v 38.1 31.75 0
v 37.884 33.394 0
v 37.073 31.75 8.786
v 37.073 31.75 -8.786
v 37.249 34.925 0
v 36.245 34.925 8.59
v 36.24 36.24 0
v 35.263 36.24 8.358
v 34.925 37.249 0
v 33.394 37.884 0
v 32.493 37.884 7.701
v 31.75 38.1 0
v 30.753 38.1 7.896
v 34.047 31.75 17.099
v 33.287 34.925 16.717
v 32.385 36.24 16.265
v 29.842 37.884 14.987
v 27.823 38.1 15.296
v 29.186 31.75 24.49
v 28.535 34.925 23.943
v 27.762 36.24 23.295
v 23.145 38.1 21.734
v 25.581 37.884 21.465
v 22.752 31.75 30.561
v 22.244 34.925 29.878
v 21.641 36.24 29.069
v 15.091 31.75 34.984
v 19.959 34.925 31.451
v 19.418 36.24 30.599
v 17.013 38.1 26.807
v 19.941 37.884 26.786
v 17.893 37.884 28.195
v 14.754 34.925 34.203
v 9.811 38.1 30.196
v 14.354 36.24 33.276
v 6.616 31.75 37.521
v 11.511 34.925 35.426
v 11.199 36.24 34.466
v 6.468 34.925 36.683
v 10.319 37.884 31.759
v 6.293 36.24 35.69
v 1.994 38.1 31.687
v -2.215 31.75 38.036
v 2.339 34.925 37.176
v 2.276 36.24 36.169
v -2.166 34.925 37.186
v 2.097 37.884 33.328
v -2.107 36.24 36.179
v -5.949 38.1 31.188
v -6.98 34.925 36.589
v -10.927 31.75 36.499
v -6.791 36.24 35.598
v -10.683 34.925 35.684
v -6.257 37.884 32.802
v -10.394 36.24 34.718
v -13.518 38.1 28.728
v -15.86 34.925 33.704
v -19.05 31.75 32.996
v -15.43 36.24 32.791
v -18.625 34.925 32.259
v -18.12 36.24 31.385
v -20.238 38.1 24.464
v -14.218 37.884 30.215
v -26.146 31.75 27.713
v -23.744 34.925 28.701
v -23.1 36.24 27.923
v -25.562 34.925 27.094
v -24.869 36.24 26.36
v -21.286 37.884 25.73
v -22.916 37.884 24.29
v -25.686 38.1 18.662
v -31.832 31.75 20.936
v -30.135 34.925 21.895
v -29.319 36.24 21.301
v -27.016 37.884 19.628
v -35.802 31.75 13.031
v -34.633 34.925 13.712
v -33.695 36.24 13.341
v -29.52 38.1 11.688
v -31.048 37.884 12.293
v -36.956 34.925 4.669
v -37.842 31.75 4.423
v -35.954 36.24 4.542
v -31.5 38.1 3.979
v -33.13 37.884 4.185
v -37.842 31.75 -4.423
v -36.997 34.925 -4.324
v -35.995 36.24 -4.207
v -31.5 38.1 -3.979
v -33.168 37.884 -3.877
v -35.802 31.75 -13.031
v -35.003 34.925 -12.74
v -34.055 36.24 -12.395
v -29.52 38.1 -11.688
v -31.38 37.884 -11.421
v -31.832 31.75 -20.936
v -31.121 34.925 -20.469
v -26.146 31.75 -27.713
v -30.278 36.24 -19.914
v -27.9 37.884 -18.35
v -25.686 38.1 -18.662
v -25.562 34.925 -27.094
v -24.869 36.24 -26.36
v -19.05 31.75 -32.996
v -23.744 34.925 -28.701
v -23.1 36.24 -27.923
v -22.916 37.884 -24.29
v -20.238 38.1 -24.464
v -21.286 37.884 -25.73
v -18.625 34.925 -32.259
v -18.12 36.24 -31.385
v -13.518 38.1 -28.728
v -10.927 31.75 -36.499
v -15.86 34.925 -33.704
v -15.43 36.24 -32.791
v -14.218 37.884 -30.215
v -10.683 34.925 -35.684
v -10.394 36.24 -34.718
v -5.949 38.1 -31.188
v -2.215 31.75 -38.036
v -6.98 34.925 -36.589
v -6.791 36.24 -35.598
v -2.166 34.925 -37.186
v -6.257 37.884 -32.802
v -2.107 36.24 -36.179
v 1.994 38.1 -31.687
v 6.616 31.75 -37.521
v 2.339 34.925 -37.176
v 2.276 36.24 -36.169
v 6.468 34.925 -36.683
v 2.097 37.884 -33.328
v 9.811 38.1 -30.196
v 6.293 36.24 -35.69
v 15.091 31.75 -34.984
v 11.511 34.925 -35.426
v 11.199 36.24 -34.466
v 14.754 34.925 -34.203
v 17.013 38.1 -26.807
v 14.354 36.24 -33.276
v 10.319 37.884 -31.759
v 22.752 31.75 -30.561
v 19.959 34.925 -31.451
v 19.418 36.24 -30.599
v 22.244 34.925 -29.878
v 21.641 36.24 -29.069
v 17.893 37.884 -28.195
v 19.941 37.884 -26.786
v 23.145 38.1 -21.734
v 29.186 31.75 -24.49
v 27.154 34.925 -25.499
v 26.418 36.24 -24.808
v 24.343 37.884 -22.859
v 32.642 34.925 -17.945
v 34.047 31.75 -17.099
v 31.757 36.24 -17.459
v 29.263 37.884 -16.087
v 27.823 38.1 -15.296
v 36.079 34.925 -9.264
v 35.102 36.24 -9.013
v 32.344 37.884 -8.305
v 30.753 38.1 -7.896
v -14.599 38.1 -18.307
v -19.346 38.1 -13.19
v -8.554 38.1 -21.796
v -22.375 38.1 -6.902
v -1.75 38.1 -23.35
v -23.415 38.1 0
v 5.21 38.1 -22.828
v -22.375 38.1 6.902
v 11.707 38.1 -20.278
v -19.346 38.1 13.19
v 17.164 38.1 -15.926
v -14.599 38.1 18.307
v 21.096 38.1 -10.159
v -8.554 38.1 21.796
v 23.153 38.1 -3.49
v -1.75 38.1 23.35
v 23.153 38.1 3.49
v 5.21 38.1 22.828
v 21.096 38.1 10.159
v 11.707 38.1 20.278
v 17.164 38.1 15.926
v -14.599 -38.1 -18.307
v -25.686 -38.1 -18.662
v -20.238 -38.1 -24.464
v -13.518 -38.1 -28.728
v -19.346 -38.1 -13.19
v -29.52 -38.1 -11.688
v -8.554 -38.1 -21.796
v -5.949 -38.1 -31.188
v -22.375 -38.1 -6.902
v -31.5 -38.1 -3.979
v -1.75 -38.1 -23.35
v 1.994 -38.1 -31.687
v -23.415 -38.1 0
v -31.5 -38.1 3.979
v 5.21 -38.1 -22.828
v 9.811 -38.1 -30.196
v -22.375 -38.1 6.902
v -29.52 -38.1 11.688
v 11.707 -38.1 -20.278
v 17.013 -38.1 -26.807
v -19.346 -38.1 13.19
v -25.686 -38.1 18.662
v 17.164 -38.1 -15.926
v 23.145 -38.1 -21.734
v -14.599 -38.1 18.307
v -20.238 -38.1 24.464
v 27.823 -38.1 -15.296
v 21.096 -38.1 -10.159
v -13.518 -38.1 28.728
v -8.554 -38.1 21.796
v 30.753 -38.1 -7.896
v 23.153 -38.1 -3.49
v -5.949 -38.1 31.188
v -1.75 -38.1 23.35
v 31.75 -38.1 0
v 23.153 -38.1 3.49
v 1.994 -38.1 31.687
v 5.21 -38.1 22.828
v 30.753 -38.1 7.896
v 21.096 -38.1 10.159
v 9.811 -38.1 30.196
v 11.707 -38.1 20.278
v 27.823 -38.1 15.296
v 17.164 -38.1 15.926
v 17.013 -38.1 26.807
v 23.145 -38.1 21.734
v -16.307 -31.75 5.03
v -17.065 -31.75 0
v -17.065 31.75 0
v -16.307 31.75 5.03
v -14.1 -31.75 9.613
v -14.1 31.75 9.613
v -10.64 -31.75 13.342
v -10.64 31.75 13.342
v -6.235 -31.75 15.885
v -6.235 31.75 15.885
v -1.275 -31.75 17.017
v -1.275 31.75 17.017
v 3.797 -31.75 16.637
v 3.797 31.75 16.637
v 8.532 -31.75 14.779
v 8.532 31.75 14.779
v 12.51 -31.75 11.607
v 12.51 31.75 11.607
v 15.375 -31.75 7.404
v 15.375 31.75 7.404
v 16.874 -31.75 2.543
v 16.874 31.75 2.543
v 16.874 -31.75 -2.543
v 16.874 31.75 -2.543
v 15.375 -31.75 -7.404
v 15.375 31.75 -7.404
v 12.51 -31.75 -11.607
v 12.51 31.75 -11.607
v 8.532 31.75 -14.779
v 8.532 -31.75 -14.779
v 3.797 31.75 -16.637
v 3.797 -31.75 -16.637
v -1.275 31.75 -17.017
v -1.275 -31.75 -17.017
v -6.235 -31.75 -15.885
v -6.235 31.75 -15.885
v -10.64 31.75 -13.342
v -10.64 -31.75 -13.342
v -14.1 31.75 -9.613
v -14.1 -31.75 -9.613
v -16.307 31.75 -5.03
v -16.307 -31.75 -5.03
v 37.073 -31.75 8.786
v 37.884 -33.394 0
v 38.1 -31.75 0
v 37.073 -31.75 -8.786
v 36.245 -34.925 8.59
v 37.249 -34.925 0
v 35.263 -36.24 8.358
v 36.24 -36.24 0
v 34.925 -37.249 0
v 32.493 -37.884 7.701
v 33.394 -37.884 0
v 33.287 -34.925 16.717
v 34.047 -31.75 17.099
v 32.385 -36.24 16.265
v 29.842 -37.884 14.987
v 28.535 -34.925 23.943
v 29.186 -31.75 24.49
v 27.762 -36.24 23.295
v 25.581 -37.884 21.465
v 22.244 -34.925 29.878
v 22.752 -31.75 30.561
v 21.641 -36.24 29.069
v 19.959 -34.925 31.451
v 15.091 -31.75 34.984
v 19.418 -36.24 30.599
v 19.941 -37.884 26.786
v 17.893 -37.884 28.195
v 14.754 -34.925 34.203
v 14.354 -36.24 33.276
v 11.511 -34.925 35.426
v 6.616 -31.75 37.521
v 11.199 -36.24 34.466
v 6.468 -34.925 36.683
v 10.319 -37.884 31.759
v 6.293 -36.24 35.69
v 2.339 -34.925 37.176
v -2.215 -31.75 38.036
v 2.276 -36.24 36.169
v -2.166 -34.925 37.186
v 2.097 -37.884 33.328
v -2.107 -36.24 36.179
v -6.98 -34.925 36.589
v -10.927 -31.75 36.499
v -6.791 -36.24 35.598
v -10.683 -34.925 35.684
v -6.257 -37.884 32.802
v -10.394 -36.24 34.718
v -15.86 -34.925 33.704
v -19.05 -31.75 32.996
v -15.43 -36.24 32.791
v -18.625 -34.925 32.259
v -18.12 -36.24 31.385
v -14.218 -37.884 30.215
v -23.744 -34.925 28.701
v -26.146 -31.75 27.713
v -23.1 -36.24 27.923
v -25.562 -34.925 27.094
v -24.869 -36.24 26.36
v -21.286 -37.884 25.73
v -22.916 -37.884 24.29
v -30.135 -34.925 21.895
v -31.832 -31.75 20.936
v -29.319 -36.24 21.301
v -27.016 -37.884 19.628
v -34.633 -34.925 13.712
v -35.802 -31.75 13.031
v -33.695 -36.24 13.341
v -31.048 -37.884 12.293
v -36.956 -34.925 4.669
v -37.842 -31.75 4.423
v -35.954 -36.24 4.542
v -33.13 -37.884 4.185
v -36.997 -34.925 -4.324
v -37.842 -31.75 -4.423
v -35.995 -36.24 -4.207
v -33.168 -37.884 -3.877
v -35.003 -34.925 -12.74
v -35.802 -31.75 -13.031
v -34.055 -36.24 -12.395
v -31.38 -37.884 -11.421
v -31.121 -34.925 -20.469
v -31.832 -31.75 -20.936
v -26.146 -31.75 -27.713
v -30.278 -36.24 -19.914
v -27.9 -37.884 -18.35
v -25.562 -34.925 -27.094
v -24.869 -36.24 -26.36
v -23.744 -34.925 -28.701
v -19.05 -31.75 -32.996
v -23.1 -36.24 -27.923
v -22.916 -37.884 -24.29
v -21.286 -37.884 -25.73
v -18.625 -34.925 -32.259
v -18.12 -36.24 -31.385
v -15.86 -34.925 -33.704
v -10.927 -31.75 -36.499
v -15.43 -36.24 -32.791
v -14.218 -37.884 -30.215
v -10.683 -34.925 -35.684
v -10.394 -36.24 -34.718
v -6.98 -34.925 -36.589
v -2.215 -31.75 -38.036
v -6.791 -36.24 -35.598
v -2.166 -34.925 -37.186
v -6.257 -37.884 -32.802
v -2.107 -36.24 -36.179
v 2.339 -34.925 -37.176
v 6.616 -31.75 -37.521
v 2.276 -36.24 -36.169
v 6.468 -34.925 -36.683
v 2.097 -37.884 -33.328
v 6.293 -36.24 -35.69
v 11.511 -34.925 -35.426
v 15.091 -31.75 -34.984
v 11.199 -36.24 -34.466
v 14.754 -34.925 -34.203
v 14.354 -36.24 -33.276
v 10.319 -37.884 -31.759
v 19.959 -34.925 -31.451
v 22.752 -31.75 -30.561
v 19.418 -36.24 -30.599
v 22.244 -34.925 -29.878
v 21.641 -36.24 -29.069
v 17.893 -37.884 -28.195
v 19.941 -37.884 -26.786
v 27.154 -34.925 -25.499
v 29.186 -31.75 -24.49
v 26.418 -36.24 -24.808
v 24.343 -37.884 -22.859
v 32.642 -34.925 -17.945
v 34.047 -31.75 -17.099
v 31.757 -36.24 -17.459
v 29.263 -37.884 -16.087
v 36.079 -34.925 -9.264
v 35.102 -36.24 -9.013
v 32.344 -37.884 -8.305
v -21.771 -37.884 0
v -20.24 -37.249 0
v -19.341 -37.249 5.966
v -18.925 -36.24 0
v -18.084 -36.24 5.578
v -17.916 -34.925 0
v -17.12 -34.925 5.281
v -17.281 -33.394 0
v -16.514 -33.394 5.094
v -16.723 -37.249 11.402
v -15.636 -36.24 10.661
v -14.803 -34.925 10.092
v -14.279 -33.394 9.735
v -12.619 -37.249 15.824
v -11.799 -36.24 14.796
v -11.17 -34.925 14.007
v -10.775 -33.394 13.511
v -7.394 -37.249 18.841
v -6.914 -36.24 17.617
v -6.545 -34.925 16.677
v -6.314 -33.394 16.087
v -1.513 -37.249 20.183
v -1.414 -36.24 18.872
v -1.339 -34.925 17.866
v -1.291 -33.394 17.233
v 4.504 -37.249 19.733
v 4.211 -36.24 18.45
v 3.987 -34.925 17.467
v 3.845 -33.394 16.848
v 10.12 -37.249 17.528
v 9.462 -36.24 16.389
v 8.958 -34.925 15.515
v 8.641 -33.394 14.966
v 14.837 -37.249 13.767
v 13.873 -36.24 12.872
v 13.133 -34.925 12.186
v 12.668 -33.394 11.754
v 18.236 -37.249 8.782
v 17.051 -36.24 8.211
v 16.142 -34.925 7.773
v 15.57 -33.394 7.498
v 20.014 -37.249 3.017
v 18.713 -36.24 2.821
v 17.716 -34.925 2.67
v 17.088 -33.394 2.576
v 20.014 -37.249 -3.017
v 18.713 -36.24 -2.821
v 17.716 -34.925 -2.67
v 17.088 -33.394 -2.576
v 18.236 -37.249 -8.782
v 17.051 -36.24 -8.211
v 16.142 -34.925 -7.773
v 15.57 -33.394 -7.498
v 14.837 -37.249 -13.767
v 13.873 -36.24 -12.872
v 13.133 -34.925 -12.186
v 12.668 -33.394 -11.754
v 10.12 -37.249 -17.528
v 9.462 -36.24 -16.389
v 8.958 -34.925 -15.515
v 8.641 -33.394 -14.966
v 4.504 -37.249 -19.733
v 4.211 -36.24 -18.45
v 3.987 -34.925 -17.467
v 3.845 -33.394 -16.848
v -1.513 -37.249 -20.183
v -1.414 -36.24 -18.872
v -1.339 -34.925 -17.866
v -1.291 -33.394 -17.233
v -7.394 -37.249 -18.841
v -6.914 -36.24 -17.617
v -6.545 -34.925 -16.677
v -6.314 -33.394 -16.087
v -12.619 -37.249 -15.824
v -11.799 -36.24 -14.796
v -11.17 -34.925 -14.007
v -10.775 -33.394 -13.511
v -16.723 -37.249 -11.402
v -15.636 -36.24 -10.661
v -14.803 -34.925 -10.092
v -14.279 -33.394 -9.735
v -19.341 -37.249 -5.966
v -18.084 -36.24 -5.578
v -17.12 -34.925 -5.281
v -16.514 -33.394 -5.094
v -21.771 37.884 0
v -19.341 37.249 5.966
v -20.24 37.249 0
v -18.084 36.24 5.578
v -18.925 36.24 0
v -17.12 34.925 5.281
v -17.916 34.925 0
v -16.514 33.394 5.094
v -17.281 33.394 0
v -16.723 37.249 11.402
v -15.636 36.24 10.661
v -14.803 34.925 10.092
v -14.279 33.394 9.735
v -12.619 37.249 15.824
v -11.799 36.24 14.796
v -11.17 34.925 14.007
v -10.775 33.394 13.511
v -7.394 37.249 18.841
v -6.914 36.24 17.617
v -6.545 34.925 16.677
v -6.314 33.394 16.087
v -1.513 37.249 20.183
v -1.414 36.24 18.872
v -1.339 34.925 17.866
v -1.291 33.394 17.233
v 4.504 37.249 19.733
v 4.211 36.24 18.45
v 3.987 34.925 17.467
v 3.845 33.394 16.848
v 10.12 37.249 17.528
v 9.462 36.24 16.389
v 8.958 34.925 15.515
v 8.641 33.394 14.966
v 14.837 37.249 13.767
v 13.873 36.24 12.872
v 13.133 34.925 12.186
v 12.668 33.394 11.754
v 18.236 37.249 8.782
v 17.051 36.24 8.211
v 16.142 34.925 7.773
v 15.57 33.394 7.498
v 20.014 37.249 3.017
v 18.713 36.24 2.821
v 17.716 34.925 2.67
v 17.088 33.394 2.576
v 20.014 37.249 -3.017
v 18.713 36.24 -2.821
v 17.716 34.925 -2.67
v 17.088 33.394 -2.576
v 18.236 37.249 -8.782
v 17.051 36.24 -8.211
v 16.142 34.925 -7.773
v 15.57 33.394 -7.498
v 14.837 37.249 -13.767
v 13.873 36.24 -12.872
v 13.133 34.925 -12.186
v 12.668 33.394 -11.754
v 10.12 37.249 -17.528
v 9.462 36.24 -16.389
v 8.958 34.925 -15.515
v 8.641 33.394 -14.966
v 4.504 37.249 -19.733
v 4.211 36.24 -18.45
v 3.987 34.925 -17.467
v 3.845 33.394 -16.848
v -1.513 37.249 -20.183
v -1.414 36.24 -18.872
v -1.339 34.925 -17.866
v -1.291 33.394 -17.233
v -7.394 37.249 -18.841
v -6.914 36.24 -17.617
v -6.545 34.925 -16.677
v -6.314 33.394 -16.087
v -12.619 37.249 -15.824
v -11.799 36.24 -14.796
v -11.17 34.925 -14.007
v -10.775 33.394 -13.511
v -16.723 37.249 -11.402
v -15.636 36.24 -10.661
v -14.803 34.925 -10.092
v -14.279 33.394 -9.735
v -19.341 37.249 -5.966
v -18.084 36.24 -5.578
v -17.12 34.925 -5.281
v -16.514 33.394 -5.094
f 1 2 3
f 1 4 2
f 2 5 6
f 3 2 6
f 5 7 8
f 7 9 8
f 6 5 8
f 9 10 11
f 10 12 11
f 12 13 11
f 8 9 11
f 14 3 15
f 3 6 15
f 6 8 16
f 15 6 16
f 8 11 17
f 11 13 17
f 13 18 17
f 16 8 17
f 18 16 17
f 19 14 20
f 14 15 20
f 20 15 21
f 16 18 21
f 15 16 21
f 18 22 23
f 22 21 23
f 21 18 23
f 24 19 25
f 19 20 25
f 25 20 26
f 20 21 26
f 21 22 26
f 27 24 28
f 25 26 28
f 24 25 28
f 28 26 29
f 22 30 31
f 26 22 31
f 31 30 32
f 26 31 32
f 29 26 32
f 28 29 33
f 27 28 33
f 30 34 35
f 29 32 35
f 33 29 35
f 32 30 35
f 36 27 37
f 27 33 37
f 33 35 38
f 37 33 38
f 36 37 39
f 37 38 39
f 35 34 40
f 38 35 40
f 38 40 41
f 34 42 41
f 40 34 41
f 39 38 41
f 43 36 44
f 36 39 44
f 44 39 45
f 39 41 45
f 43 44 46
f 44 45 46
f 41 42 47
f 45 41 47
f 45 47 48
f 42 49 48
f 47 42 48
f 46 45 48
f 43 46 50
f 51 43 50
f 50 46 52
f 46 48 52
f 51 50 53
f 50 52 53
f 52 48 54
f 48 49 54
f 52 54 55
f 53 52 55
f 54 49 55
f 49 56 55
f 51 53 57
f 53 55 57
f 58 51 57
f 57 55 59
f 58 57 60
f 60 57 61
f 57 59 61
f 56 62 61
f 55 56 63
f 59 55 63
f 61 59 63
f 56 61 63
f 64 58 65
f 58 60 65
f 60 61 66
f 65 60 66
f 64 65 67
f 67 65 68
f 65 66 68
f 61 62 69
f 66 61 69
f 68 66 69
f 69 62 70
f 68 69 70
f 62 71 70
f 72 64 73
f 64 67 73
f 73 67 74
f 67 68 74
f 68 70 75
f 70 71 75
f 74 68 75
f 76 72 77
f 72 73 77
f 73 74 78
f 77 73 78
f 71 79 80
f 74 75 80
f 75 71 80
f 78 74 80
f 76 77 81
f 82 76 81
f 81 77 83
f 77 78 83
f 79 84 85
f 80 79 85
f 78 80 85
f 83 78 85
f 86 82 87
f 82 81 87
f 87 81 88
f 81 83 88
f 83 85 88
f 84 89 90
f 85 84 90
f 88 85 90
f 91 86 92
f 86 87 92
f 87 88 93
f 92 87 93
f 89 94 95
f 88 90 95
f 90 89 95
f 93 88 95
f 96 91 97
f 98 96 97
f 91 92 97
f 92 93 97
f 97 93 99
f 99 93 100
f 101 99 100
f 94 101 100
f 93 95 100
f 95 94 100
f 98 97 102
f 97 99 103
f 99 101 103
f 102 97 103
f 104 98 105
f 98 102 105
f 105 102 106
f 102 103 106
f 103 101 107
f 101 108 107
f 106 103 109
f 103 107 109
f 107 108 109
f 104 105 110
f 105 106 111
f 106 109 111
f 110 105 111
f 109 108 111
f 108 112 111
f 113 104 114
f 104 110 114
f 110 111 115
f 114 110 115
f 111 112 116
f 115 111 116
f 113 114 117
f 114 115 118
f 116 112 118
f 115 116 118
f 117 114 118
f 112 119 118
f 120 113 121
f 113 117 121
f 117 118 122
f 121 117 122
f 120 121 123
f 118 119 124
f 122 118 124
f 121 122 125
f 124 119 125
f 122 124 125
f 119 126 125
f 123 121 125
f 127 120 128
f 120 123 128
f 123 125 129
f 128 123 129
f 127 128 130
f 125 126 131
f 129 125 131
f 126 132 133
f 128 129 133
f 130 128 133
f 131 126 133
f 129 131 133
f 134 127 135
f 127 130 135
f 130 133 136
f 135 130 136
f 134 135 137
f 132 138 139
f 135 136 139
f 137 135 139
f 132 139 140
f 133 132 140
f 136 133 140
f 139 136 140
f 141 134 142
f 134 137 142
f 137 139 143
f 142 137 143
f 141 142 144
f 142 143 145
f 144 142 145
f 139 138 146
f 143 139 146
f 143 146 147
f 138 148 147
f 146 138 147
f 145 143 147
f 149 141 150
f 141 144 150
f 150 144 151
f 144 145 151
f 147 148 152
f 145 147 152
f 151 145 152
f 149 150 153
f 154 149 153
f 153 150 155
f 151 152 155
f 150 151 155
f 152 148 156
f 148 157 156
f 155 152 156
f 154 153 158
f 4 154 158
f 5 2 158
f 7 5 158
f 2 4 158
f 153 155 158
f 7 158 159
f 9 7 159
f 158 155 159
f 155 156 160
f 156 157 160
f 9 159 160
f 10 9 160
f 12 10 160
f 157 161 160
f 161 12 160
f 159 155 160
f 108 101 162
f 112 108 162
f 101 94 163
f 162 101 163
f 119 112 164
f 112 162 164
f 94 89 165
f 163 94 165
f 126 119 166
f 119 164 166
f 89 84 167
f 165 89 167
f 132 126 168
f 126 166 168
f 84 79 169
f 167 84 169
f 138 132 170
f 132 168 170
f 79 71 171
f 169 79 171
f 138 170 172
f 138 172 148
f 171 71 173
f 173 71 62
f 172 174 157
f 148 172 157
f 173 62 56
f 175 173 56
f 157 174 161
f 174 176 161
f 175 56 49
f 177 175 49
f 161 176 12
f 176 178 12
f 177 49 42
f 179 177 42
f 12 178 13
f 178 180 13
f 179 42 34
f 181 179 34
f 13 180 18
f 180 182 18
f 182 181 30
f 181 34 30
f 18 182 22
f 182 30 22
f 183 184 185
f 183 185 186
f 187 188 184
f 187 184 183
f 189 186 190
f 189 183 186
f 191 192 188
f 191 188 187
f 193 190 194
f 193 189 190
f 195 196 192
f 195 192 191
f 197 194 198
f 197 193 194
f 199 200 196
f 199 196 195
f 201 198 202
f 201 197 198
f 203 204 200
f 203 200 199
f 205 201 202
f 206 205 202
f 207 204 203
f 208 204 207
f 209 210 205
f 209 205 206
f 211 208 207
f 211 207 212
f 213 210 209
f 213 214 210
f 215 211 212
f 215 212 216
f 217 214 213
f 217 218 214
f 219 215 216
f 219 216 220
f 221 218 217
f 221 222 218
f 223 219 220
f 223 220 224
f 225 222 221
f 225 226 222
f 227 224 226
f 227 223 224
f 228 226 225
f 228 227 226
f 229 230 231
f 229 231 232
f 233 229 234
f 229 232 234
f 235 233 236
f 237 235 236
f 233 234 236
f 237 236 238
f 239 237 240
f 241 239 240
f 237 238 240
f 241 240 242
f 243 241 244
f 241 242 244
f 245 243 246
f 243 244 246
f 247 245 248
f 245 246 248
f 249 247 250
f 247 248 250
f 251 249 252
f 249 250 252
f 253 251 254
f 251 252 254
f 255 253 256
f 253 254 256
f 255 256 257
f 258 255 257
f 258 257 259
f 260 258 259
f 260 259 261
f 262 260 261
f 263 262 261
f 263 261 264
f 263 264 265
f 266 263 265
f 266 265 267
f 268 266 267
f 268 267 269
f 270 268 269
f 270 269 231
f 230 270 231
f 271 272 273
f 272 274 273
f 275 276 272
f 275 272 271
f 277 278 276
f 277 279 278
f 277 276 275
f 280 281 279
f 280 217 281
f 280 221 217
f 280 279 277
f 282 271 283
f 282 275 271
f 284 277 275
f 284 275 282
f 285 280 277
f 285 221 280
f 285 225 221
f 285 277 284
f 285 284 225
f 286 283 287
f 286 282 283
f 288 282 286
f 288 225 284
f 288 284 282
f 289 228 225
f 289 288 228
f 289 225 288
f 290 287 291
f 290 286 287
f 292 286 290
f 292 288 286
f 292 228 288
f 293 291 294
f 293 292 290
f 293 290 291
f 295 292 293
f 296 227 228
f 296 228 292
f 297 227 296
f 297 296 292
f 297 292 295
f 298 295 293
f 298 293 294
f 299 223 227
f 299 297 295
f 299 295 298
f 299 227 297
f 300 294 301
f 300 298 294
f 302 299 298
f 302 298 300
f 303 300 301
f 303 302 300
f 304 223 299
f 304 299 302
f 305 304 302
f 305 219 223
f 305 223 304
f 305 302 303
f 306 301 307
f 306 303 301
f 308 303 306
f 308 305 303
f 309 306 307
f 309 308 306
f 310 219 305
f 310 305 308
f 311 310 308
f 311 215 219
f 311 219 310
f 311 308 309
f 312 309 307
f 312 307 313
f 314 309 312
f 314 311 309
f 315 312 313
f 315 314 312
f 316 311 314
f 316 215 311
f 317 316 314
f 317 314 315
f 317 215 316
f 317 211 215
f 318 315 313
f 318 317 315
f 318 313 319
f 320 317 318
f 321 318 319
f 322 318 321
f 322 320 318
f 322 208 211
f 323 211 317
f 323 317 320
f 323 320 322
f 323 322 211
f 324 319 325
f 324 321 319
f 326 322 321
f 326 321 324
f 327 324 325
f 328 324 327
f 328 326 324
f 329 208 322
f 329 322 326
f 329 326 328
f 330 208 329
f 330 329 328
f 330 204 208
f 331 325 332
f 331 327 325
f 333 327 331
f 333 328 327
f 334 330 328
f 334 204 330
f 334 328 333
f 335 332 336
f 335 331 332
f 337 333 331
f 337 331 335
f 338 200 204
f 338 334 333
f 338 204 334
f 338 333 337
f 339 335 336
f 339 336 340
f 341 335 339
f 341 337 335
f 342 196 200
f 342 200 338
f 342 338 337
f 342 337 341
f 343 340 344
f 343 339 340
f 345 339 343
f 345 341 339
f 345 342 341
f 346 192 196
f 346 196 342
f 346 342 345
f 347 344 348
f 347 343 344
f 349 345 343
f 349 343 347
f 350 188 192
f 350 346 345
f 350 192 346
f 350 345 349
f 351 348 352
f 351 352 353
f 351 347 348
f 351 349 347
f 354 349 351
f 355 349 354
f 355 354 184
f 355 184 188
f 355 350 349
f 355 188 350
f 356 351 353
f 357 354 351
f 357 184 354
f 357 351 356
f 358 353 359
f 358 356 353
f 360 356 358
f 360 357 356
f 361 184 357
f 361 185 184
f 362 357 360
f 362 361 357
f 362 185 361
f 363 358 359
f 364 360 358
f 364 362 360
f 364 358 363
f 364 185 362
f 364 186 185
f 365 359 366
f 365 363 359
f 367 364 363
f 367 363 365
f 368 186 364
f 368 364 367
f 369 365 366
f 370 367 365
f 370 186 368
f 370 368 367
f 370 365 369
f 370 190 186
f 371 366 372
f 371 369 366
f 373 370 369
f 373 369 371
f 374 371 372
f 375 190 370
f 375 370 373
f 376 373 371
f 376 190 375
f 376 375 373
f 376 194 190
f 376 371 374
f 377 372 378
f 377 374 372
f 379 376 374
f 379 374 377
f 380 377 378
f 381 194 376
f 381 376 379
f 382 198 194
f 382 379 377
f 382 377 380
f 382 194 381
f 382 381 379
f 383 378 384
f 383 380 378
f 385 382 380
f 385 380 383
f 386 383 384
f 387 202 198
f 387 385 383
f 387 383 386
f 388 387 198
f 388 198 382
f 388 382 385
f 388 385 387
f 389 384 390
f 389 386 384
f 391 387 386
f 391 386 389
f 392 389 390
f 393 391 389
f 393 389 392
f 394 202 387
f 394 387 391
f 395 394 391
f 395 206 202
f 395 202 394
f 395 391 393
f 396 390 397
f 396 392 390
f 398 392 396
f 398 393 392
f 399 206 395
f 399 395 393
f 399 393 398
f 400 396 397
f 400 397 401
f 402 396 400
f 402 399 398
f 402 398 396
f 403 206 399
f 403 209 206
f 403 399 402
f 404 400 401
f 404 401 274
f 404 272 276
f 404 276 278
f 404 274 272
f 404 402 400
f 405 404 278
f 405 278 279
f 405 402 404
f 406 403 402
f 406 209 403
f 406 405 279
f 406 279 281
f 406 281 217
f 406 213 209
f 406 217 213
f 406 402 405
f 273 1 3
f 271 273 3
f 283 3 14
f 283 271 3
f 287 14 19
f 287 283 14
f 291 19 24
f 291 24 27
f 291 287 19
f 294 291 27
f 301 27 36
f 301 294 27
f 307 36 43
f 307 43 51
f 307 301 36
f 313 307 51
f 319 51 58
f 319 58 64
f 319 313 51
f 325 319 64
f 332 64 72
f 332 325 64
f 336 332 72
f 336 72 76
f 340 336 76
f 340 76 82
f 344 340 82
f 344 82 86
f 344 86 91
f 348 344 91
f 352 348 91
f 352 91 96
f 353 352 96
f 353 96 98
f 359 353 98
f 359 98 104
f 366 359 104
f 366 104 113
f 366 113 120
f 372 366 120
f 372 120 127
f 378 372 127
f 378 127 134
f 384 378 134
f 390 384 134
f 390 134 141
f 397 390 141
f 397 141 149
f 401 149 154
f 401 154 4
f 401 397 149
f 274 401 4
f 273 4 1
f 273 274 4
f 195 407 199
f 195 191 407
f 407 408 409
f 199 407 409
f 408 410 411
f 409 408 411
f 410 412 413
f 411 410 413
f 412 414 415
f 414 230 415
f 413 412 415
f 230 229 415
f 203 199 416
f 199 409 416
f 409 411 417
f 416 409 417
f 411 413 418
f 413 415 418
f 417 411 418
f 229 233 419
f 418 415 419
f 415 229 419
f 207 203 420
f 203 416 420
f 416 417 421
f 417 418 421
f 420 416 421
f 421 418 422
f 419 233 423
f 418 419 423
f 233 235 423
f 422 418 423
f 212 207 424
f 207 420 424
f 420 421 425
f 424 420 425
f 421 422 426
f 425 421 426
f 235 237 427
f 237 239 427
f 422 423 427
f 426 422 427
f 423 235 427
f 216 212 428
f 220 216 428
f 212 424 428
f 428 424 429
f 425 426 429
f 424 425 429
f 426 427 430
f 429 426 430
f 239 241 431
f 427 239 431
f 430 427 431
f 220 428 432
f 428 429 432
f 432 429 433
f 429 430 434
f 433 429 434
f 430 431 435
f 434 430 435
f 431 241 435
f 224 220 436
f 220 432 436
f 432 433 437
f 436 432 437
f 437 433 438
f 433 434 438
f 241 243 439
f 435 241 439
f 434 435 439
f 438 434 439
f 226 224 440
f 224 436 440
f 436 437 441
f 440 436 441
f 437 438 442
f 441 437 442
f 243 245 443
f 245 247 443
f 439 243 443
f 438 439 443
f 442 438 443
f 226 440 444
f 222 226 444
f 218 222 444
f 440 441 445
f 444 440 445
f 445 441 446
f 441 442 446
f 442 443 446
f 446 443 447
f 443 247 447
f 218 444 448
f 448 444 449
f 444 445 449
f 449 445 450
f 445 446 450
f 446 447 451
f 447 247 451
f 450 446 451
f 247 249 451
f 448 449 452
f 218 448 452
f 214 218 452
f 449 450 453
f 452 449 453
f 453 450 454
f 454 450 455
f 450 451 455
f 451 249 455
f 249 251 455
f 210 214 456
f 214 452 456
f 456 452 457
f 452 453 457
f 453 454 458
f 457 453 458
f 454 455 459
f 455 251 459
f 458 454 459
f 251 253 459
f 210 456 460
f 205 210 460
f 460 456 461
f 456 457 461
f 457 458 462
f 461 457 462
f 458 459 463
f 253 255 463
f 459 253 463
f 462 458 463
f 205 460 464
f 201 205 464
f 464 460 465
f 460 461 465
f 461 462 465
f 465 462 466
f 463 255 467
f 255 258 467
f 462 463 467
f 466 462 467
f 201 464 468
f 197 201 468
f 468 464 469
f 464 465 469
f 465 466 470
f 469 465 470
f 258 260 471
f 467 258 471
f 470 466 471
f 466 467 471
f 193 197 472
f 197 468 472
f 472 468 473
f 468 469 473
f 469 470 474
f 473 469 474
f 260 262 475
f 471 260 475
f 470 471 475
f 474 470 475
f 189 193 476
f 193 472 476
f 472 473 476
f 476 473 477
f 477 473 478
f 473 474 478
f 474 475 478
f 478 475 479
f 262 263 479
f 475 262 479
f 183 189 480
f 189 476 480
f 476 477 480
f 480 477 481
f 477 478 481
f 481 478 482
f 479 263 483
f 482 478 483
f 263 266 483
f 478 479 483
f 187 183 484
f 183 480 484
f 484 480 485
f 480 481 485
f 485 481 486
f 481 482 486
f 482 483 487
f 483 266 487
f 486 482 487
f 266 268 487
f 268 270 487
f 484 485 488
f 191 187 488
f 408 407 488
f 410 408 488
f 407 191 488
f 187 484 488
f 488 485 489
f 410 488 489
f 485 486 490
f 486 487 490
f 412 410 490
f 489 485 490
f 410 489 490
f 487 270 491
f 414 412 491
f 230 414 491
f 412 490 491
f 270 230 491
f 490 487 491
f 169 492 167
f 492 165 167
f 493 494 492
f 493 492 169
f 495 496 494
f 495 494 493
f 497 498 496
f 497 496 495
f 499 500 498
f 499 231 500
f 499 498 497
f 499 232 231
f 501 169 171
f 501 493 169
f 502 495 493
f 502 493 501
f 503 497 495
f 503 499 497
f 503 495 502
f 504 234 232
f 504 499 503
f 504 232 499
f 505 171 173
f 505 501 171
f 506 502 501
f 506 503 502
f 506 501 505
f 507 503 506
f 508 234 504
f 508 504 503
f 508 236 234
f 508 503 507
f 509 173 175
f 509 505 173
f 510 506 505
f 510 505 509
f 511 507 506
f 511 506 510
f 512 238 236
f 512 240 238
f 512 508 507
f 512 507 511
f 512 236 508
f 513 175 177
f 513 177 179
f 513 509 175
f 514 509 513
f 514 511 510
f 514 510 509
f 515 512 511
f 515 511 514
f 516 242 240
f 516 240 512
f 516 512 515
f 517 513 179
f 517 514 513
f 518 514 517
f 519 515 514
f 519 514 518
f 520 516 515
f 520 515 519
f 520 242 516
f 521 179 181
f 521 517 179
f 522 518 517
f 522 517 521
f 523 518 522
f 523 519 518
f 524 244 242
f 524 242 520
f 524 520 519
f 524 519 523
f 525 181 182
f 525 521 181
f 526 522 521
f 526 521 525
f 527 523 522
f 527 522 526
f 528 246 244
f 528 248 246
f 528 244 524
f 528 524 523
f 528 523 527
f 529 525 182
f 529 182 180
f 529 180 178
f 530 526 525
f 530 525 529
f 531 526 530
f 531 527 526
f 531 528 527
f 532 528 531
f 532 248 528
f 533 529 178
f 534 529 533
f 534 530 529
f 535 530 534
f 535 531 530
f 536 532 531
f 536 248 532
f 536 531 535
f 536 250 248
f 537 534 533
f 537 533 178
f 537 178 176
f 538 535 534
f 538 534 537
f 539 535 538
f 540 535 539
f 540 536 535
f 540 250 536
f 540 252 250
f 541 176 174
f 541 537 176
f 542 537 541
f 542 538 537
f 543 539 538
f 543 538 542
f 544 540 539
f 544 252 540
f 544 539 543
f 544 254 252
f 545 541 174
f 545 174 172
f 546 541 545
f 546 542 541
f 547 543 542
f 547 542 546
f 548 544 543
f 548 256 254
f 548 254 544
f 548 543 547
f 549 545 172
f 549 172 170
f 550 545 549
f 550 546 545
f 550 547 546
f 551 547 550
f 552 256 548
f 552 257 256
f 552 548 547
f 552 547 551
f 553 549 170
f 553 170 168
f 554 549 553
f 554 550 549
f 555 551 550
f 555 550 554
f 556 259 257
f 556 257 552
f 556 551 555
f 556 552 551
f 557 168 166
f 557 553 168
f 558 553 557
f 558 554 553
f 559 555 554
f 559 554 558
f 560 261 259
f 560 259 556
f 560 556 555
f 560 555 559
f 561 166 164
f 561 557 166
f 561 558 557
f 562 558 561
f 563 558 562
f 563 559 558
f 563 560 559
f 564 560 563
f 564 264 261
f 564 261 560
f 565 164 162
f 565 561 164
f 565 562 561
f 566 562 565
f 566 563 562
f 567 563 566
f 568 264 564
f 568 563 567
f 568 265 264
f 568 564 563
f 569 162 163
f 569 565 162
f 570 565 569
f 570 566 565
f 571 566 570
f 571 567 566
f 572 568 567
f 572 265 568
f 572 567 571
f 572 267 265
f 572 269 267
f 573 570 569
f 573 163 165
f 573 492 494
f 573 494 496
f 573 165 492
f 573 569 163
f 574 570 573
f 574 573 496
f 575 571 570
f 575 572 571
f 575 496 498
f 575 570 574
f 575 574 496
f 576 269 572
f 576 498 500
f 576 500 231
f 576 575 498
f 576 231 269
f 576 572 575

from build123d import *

# Parameters (mm, degrees)
F0_R     = 38.1
F1_DEPTH = 38.1
F3_D     = 34.12998
F4_R     = 6.35


with BuildPart() as f1:
    # F0 (on Front) → F1 (new body, symmetric)
    with BuildSketch(Plane.XZ):
        Circle(F0_R)
    extrude(amount=F1_DEPTH, both=True)

    # F3 (through all)
    with Locations(Plane.XZ.offset(38.1)):
        with Locations((0, 0)):
            Hole(F3_D / 2)

    # F4
    f4_edges = [f1.edges().sort_by_distance(p)[0] for p in [
        (-38.1, -38.1, 0),
        (-38.1, 38.1, 0),
        (-17.06499, 38.1, 0),
        (-17.06499, -38.1, 0),
    ]]
    fillet(f4_edges, radius=F4_R)


solid = f1.part
